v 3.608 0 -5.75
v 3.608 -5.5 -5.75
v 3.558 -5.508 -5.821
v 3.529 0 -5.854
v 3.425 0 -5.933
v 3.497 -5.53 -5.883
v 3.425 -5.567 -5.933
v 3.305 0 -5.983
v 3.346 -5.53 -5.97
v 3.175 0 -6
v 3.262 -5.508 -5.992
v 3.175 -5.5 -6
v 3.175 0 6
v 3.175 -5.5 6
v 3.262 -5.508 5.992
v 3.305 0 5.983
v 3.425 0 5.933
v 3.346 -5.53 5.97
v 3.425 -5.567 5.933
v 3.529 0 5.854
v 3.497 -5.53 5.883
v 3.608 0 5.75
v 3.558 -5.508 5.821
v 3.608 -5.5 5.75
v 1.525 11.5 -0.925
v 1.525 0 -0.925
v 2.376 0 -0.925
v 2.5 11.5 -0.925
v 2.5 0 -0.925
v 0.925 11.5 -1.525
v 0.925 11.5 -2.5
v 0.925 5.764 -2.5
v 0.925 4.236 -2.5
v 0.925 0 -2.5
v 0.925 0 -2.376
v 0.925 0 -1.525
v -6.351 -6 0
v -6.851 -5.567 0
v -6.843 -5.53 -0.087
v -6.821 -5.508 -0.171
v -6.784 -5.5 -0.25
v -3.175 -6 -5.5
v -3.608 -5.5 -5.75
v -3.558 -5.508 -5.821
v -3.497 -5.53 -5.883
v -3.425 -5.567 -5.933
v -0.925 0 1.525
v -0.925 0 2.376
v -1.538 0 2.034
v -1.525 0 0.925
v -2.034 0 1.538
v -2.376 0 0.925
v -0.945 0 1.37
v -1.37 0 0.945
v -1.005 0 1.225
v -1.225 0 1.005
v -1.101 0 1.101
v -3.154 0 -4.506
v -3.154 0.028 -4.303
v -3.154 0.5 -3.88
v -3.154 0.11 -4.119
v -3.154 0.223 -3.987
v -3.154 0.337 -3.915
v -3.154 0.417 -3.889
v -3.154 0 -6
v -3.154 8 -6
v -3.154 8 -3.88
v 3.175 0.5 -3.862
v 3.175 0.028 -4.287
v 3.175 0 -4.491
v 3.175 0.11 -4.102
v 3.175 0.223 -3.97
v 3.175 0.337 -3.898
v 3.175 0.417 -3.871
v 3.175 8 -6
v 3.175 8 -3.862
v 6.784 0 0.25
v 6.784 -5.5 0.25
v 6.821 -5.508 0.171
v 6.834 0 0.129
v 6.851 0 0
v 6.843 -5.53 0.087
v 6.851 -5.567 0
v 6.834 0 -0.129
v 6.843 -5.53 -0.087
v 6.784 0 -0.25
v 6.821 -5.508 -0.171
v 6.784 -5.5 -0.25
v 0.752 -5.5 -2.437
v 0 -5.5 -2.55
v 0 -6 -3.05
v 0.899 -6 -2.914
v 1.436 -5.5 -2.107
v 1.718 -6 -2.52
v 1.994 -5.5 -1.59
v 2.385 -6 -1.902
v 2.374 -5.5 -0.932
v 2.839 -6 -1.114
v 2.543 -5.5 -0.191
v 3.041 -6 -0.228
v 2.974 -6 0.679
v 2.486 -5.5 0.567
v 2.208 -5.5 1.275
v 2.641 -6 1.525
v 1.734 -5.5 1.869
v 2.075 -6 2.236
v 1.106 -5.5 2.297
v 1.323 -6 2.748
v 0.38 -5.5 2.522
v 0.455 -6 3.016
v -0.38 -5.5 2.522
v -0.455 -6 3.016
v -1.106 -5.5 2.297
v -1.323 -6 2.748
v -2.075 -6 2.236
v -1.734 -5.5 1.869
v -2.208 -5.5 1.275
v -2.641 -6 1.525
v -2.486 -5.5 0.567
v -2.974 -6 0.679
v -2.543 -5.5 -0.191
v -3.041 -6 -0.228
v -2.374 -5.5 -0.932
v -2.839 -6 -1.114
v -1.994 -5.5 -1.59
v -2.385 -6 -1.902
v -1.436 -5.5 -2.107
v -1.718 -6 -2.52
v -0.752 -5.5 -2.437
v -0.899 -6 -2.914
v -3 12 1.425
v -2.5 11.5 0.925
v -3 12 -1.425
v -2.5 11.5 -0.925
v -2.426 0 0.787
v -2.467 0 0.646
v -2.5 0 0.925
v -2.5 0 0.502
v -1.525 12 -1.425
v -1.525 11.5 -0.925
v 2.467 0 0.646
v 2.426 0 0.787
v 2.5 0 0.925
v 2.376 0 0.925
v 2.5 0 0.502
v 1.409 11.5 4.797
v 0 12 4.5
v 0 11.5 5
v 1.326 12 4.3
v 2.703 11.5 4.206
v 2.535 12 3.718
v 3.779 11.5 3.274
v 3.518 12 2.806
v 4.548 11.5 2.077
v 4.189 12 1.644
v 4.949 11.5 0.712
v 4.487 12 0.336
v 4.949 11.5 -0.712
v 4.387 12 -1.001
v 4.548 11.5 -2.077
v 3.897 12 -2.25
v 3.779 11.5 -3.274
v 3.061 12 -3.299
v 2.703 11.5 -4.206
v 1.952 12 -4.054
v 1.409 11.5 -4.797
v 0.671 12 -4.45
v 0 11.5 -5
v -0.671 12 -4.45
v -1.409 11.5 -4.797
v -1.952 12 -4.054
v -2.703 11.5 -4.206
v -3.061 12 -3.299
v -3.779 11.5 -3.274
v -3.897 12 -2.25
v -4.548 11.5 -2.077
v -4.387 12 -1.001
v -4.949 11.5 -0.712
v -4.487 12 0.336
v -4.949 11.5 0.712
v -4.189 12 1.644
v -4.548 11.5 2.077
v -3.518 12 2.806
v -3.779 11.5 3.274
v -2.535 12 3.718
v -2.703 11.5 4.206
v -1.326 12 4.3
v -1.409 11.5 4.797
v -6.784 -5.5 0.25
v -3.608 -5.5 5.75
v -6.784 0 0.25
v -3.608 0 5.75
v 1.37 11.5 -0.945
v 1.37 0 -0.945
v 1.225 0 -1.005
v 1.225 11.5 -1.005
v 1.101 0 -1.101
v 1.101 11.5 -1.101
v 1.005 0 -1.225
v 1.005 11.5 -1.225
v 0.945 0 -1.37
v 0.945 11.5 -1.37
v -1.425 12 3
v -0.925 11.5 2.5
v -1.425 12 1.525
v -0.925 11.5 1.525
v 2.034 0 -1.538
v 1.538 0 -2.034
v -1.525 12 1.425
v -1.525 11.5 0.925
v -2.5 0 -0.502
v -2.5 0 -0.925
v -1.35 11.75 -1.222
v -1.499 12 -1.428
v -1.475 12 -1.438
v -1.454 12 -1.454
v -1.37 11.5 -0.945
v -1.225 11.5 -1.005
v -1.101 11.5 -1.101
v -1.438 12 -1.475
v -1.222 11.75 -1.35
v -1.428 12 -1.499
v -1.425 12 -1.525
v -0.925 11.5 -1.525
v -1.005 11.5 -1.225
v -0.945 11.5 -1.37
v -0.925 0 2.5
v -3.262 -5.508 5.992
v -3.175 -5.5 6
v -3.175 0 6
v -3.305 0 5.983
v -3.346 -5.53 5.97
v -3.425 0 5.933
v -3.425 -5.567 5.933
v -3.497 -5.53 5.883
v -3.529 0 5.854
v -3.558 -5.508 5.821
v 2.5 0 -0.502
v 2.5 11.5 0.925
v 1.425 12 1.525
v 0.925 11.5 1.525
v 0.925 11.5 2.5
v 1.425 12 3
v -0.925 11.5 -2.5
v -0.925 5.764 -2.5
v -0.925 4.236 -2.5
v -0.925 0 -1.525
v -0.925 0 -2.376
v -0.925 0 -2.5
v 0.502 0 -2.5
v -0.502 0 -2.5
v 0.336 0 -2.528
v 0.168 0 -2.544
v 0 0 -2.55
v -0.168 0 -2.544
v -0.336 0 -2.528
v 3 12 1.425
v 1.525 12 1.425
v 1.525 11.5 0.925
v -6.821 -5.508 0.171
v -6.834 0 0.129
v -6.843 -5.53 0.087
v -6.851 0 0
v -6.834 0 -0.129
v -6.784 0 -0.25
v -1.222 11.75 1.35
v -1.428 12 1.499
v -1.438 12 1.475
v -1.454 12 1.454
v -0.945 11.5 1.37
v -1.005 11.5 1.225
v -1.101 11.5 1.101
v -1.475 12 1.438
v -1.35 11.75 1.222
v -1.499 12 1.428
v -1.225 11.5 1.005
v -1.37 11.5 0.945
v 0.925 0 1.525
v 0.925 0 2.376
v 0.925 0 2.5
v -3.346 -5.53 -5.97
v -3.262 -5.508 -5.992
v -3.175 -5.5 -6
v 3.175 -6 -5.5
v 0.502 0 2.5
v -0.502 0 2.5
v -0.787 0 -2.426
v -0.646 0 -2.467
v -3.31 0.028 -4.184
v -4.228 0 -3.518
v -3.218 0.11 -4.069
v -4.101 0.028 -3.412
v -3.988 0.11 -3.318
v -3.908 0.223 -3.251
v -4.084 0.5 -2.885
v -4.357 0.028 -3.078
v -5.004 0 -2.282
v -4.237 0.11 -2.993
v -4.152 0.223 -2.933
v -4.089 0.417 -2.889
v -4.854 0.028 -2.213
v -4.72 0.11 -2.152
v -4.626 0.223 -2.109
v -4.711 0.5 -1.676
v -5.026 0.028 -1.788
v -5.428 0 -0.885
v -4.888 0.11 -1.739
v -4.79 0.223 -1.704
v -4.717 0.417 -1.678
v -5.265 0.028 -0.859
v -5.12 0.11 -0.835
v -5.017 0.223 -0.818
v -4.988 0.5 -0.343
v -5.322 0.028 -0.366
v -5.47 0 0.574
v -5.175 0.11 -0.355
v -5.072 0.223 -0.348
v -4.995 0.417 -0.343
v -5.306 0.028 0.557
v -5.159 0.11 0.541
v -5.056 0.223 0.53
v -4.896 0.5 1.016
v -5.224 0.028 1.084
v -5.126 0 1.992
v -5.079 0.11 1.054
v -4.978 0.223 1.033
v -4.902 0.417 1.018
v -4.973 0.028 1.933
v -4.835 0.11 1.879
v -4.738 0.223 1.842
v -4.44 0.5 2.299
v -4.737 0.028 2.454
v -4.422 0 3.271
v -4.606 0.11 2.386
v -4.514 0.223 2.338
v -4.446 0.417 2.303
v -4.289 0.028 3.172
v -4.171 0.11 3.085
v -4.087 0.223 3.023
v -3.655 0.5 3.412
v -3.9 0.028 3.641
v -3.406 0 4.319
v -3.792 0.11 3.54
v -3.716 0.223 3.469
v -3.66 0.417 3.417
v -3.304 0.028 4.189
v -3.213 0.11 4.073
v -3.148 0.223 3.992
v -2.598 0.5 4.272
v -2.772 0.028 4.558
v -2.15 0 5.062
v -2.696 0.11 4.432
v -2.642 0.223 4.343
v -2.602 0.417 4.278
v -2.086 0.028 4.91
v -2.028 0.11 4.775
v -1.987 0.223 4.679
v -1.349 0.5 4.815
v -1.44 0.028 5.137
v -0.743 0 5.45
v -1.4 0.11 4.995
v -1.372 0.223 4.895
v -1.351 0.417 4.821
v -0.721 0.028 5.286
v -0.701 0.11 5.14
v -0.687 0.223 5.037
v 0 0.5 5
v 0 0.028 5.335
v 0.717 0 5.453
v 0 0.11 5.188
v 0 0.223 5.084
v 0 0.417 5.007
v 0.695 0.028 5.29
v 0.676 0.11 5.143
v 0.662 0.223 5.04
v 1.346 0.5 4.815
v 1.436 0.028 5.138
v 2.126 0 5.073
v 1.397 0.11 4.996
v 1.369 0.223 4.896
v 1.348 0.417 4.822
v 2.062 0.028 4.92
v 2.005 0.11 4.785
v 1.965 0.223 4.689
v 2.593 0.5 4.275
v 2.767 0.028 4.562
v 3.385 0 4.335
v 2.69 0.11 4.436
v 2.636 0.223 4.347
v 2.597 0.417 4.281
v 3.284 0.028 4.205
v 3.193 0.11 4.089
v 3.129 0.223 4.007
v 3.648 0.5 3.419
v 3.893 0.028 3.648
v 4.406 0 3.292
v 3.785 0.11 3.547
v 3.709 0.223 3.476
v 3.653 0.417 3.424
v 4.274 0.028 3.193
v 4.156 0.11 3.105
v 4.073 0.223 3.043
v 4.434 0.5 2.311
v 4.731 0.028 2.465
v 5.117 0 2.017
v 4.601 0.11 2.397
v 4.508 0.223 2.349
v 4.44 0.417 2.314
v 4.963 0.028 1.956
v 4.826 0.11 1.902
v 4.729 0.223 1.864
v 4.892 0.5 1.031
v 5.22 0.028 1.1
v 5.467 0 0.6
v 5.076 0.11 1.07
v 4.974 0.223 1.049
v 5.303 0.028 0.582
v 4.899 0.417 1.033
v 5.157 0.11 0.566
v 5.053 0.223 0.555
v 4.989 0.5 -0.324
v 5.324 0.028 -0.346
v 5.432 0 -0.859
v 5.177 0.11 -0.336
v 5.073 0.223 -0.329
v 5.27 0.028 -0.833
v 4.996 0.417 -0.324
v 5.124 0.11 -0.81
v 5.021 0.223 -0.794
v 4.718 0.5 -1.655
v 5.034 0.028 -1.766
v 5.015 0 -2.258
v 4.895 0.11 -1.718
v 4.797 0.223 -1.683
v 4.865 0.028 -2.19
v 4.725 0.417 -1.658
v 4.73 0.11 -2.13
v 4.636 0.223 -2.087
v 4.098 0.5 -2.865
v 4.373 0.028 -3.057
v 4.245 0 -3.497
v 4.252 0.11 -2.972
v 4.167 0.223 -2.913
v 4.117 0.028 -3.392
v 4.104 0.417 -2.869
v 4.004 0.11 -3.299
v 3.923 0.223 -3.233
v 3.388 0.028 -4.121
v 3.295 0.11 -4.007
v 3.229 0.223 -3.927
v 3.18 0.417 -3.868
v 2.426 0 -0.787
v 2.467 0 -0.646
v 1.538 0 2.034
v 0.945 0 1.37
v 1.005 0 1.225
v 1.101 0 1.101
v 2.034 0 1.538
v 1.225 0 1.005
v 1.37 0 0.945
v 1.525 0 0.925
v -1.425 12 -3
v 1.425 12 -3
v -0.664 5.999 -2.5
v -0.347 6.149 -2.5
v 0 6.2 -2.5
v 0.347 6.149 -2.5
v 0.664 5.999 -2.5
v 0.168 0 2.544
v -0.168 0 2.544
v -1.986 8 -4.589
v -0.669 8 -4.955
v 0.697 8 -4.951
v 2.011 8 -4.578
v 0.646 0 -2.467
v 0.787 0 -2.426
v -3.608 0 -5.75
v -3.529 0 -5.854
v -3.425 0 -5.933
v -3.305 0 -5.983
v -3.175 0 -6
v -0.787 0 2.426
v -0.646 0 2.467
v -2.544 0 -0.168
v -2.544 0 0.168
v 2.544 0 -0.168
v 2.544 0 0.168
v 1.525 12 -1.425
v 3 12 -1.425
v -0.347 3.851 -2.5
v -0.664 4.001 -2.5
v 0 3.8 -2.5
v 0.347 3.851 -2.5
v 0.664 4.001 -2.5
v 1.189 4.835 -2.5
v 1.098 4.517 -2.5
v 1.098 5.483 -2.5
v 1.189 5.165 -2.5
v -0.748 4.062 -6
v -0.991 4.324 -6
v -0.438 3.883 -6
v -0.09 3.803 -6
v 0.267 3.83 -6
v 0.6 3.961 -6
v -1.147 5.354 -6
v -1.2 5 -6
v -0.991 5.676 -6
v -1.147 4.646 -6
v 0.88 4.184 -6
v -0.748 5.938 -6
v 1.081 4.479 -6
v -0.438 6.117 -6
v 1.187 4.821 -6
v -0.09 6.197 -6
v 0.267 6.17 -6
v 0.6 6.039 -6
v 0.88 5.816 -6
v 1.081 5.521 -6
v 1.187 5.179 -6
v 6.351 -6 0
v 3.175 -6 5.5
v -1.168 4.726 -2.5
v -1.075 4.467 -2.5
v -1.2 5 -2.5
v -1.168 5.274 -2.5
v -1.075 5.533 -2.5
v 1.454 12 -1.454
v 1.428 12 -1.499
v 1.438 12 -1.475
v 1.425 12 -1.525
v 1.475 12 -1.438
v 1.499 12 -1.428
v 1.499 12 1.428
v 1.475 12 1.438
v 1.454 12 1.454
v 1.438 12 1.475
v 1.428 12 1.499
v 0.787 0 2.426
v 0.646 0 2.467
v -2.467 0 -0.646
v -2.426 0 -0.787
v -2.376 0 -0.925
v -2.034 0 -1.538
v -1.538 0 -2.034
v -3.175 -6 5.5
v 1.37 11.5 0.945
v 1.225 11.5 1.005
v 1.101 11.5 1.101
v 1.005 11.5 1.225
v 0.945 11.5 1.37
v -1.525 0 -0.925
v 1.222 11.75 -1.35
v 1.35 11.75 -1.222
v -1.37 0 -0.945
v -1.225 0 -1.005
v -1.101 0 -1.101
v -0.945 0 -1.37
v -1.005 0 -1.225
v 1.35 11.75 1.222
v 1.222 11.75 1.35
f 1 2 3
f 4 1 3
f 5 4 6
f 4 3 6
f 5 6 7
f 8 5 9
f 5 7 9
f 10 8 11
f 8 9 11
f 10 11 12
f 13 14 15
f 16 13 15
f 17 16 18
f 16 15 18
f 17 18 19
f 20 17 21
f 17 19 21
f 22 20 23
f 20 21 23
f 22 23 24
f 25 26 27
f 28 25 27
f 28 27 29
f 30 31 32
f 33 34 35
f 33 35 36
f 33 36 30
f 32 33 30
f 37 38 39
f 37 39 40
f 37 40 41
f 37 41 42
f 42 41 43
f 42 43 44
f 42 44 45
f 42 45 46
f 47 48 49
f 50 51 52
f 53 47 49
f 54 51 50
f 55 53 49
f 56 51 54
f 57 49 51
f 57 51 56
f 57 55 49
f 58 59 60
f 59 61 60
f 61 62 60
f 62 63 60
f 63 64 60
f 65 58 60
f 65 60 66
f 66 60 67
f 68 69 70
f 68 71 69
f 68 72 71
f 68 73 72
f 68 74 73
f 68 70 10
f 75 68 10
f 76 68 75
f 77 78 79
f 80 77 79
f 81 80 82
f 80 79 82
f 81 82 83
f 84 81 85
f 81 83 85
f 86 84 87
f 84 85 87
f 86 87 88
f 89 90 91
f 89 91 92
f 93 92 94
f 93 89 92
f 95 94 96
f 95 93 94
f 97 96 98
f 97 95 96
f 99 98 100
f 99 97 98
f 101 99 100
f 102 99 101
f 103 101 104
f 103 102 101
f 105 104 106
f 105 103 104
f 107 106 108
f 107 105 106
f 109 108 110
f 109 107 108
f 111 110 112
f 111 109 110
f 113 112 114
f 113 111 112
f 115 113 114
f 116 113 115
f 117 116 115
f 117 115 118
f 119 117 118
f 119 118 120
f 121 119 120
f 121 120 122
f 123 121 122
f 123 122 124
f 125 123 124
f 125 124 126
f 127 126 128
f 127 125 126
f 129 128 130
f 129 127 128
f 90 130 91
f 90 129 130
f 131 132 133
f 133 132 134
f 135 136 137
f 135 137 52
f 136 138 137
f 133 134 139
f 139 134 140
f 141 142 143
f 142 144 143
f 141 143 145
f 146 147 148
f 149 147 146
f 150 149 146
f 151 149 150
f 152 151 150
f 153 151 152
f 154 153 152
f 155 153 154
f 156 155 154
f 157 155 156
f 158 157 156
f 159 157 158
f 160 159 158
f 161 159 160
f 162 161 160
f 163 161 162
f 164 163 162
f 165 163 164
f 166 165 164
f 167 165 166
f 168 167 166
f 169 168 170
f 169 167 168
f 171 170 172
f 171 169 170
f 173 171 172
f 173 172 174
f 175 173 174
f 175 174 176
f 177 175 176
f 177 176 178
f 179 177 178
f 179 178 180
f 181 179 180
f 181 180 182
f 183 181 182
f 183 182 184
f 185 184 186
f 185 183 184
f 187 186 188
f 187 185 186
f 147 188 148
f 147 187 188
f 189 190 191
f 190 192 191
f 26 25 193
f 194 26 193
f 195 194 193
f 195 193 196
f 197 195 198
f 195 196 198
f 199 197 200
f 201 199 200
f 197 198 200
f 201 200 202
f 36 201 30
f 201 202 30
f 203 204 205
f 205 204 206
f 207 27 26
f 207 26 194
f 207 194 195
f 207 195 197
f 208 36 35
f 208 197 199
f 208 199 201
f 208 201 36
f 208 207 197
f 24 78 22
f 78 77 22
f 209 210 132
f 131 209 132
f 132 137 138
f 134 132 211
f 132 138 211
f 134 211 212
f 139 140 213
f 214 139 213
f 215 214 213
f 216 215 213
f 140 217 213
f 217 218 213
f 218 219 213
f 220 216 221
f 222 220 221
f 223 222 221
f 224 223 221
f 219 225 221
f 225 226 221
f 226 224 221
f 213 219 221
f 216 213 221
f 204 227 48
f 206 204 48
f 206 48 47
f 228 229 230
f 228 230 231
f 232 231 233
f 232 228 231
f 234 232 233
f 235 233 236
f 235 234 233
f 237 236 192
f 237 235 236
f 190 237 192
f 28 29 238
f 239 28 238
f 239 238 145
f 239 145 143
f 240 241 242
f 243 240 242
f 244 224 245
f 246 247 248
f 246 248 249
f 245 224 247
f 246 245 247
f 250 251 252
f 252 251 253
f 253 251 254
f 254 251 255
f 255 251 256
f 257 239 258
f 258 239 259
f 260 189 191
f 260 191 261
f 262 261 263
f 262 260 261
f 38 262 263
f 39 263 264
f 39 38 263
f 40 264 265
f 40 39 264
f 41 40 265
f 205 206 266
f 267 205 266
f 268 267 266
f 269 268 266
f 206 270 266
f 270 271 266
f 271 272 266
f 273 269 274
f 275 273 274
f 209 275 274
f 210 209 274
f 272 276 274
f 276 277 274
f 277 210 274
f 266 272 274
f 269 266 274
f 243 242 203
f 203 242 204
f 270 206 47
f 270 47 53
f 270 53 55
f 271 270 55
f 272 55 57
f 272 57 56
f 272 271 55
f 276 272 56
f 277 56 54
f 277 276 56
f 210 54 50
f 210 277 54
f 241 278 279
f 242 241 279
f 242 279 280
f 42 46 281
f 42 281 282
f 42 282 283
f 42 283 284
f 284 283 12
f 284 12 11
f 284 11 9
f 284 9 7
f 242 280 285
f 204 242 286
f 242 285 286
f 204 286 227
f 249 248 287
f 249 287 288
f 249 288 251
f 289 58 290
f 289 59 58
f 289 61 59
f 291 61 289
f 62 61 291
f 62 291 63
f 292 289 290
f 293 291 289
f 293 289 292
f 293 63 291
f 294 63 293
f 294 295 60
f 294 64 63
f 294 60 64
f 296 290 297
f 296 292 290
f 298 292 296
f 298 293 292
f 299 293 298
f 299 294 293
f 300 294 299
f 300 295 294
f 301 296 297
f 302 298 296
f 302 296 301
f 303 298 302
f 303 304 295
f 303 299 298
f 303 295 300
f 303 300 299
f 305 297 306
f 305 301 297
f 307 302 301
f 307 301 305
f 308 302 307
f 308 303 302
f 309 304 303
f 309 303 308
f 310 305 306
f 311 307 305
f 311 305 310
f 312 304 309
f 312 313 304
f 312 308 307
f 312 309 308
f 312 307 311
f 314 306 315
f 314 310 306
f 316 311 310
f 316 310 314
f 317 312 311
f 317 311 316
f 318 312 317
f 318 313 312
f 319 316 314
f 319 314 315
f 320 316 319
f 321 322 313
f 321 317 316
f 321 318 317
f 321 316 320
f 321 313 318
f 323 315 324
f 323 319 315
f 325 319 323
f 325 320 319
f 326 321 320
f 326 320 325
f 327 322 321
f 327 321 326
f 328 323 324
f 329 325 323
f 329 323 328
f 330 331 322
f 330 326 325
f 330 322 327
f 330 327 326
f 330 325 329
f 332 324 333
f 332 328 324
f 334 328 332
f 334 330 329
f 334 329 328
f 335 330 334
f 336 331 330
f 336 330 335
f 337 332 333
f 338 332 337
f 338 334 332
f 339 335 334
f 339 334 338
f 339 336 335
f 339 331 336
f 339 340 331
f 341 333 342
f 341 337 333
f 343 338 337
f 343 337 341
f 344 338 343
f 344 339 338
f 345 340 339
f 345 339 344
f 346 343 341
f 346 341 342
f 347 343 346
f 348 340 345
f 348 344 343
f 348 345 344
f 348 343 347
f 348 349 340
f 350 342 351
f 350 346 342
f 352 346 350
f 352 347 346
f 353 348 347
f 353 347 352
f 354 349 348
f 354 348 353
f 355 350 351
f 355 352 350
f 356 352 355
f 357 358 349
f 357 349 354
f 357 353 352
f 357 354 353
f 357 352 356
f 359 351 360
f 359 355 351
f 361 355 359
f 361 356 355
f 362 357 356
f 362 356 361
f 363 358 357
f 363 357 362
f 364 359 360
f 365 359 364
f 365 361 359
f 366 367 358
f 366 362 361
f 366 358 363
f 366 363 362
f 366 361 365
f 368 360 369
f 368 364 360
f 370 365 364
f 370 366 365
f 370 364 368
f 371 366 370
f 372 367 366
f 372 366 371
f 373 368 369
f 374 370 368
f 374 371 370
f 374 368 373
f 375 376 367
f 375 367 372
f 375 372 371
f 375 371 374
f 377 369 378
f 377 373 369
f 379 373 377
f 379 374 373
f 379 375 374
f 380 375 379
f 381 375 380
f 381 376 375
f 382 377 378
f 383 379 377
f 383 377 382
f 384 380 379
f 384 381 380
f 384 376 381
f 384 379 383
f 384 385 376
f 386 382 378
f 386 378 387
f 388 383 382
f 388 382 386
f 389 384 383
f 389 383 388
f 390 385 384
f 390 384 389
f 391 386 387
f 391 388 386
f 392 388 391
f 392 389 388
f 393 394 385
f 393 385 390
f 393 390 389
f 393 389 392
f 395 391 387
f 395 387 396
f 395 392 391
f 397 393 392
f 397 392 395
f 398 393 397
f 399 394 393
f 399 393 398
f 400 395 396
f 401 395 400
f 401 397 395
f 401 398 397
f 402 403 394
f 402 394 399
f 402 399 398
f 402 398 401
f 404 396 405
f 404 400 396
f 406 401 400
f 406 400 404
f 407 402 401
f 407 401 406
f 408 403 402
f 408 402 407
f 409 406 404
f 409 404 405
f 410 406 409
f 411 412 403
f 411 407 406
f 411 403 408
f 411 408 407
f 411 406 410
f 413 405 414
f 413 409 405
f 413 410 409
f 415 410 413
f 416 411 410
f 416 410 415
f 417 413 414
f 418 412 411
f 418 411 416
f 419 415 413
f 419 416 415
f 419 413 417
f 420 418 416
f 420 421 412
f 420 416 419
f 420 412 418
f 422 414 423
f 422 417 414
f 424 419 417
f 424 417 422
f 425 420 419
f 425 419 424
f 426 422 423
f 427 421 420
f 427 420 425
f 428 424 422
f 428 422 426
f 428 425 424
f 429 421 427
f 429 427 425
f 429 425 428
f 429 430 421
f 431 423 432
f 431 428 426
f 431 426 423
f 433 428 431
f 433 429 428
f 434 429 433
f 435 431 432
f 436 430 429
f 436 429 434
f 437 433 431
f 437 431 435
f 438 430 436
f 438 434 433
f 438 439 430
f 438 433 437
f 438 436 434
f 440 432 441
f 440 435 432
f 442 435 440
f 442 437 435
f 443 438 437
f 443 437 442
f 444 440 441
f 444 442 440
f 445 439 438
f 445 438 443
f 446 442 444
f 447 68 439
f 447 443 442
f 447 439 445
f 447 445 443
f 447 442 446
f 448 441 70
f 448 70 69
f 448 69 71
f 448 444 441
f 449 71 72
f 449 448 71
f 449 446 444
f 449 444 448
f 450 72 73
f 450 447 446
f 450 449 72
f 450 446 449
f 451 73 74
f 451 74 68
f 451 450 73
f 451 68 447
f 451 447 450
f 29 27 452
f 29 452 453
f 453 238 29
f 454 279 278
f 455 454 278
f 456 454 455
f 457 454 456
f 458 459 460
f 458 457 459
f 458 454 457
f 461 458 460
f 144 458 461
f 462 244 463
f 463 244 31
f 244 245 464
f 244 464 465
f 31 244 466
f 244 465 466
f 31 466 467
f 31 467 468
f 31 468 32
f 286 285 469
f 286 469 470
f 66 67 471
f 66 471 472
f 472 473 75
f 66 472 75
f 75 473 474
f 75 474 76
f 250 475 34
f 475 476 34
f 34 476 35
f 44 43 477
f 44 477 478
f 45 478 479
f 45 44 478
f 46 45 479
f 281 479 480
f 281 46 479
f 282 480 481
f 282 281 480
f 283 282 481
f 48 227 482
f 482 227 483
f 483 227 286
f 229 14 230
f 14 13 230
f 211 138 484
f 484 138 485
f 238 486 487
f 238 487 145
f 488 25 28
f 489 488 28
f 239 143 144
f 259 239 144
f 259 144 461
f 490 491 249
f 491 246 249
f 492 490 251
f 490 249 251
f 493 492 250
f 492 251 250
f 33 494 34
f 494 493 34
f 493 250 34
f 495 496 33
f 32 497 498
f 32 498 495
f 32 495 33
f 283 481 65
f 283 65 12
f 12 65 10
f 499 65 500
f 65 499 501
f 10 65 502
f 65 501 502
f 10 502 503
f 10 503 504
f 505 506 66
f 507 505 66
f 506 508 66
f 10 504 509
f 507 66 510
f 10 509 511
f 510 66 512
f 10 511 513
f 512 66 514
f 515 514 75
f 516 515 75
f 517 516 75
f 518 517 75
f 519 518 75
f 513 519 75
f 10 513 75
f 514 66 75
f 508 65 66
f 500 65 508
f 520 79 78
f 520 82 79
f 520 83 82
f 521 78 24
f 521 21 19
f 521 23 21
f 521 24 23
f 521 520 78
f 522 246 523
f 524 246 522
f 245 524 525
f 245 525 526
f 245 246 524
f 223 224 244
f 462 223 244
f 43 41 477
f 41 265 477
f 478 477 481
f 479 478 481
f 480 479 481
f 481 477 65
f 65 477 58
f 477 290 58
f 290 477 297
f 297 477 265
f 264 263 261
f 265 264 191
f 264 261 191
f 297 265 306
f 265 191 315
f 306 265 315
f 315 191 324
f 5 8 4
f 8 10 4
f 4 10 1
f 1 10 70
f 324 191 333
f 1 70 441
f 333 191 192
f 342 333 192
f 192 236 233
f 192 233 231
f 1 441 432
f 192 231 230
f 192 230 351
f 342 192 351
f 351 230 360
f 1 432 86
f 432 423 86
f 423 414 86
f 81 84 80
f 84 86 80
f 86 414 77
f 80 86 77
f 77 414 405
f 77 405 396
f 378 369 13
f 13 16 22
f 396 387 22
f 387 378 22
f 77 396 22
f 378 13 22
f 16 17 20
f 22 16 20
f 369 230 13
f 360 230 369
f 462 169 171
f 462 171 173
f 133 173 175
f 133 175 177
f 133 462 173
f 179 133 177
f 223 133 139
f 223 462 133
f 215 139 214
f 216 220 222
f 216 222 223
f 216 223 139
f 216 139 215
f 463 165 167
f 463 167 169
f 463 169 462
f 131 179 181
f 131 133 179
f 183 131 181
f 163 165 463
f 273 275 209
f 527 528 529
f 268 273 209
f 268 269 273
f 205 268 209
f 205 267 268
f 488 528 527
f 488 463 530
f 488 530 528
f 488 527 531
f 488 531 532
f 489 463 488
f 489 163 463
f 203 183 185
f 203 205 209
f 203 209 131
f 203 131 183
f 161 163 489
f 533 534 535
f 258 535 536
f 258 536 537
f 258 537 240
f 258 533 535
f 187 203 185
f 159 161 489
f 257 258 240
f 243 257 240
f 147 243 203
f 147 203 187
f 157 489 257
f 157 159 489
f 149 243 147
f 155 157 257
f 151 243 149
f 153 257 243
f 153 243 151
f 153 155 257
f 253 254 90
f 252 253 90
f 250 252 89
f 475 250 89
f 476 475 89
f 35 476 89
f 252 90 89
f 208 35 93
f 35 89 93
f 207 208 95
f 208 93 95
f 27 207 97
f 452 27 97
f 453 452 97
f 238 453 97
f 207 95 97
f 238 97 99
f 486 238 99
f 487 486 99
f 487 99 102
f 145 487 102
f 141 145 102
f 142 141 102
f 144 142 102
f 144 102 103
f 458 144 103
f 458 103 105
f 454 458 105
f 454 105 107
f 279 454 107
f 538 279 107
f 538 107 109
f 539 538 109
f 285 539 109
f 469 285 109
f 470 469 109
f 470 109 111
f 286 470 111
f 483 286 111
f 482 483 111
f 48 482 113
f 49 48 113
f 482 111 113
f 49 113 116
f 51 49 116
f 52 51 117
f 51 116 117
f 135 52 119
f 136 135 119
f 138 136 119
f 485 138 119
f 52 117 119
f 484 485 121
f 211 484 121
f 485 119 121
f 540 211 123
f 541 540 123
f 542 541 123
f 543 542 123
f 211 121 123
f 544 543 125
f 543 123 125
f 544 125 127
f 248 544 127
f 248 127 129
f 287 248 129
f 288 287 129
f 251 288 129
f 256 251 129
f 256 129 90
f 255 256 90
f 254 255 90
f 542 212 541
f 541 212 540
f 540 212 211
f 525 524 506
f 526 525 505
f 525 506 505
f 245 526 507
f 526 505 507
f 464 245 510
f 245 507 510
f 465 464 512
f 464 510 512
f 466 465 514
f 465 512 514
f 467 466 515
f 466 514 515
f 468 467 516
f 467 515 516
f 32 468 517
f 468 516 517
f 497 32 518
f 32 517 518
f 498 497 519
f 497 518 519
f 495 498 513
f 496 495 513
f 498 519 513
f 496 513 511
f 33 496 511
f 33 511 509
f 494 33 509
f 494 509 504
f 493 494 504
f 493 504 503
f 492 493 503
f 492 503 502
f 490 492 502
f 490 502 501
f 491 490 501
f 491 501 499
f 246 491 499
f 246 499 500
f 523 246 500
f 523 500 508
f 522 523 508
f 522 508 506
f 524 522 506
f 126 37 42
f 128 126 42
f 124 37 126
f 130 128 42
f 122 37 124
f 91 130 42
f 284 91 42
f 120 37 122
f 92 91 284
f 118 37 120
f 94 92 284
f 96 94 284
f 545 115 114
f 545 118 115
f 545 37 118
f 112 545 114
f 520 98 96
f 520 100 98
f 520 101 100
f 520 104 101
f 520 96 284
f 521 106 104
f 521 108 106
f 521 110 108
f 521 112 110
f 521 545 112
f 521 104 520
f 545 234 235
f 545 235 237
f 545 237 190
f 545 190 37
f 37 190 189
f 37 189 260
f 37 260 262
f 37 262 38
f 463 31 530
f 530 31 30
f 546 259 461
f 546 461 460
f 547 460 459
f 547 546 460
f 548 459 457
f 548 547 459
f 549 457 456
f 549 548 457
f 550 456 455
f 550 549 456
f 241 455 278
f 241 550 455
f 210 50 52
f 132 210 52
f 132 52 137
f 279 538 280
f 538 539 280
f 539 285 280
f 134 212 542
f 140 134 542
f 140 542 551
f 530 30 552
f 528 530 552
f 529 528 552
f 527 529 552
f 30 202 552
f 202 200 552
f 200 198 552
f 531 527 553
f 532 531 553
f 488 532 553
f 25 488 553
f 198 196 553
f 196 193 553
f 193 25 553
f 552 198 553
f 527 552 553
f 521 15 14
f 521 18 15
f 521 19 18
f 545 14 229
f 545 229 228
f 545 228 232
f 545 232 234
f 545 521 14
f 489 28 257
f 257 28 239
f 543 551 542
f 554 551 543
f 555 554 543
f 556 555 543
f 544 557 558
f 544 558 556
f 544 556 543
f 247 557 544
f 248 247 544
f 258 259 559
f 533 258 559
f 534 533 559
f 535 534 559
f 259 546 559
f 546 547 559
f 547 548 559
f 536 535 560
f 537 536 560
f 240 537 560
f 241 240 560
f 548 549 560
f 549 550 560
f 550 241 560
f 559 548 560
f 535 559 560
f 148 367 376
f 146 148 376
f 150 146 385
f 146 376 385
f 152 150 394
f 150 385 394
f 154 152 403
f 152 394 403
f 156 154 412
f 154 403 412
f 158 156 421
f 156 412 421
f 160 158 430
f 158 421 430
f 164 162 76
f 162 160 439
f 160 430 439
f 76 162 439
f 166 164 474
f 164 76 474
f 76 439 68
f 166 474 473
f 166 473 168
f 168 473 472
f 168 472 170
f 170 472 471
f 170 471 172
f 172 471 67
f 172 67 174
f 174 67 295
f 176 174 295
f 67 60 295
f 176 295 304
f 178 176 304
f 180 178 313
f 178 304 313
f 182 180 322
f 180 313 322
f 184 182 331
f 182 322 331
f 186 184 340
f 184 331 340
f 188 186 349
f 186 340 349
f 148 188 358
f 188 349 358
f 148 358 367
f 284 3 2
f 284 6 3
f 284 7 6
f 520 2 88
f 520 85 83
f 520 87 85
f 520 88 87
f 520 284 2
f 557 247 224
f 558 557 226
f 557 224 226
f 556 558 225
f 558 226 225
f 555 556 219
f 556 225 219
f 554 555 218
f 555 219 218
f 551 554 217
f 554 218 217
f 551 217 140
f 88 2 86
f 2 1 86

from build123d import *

# Parameters (mm, degrees)
SKETCH_1_R          = 5
EXTRUDE_4_DEPTH     = 12
FILLET_1_R          = 0.6
FILLET_2_R          = 0.6
EXTRUDE_5_DEPTH     = 6
SKETCH_3_R          = 2.55
CUT_EXTRUDE_1_DEPTH = 6
CHAMFER_1_SIZE      = 0.5
CHAMFER_4_SIZE      = 0.5
FILLET_4_R          = 0.5
FILLET_5_R          = 0.5
SKETCH_4_W          = 6.329239392
SKETCH_4_H          = 8
EXTRUDE_6_DEPTH     = 3.5
SKETCH_5_R          = 1.2
CUT_EXTRUDE_2_DEPTH = 3.5
FILLET_7_R          = 0.5


with BuildPart() as part:
    # ｽｹｯﾁ1 → ﾎﾞｽ - 押し出し4 (new body)
    with BuildSketch(Plane(origin=(0, 0, 0), x_dir=(1, 0, 0), z_dir=(0, 1, 0))):
        with Locations(Location((0, 0, 0), (0, 0, 270))):
            Circle(SKETCH_1_R)
        Polygon((-2.5, -0.925), (-2.5, 0.925), (-0.925, 0.925), (-0.925, 2.5), (0.925, 2.5), (0.925, 0.925), (2.5, 0.925), (2.5, -0.925), (0.925, -0.925), (0.925, -2.5), (-0.925, -2.5), (-0.925, -0.925), align=None, mode=Mode.SUBTRACT)
    extrude(amount=EXTRUDE_4_DEPTH)

    # ﾌｨﾚｯﾄ1
    fillet_1_edges = [part.edges().sort_by_distance(p)[0] for p in [
        (0.925, 6, -0.925),
    ]]
    fillet(fillet_1_edges, radius=FILLET_1_R)

    # ﾌｨﾚｯﾄ2
    fillet_2_edges = [part.edges().sort_by_distance(p)[0] for p in [
        (-0.925, 6, -0.925),
        (-0.925, 6, 0.925),
        (0.925, 6, 0.925),
    ]]
    fillet(fillet_2_edges, radius=FILLET_2_R)

    # ｽｹｯﾁ2 → ﾎﾞｽ - 押し出し5 (add)
    with BuildSketch(Plane.XZ):
        Polygon((6.92820323, 0), (3.464101615, 6), (-3.464101615, 6), (-6.92820323, 0), (-3.464101615, -6), (3.464101615, -6), align=None)
    extrude(amount=EXTRUDE_5_DEPTH)

    # ｽｹｯﾁ3 → ｶｯﾄ - 押し出し1 (cut)
    with BuildSketch(Plane.XZ.offset(6)):
        with Locations(Location((0, 0, 0), (0, 0, 270))):
            Circle(SKETCH_3_R)
    extrude(amount=-CUT_EXTRUDE_1_DEPTH, mode=Mode.SUBTRACT)

    # 面取り1
    chamfer_1_edges = [part.edges().sort_by_distance(p)[0] for p in [
        (0, -6, 2.55),
        (5.196152423, -6, -3),
        (5.196152423, -6, 3),
        (0, -6, 6),
        (-5.196152423, -6, 3),
        (-5.196152423, -6, -3),
        (0, -6, -6),
    ]]
    chamfer(chamfer_1_edges, length=CHAMFER_1_SIZE)

    # 面取り4
    chamfer_4_edges = [part.edges().sort_by_distance(p)[0] for p in [
        (2.5, 12, 0),
        (-2.0125, 12, -0.925),
        (-2.0125, 12, 0.925),
        (-2.5, 12, 0),
        (0, 12, -5),
        (2.0125, 12, -0.925),
        (1.100735931, 12, -1.100735931),
        (-0.925, 12, 2.0125),
        (2.0125, 12, 0.925),
        (0.925, 12, 2.0125),
        (1.100735931, 12, 1.100735931),
        (-1.100735931, 12, -1.100735931),
        (-1.100735931, 12, 1.100735931),
        (0.925, 12, -2.0125),
        (0, 12, -2.5),
        (0, 12, 2.5),
        (-0.925, 12, -2.0125),
    ]]
    chamfer(chamfer_4_edges, length=CHAMFER_4_SIZE)

    # ﾌｨﾚｯﾄ4
    fillet_4_edges = [part.edges().sort_by_distance(p)[0] for p in [
        (-3.464101615, -2.75, 6),
    ]]
    fillet(fillet_4_edges, radius=FILLET_4_R)

    # ﾌｨﾚｯﾄ5
    fillet_5_edges = [part.edges().sort_by_distance(p)[0] for p in [
        (3.464101615, -2.75, -6),
        (-3.464101615, -2.75, -6),
        (-6.92820323, -2.75, 0),
        (3.464101615, -2.75, 6),
        (6.92820323, -2.75, 0),
    ]]
    fillet(fillet_5_edges, radius=FILLET_5_R)

    # ｽｹｯﾁ4 → ﾎﾞｽ - 押し出し6 (add)
    with BuildSketch(Plane.XY.offset(-2.5)):
        with Locations((0.010806785, 4)):
            Rectangle(SKETCH_4_W, SKETCH_4_H)
    extrude(amount=-EXTRUDE_6_DEPTH)

    # ｽｹｯﾁ5 → ｶｯﾄ - 押し出し2 (cut)
    with BuildSketch(Plane(origin=(0, 0, -6), x_dir=(-1, 0, 0), z_dir=(0, 0, -1))):
        with Locations((0, 5)):
            Circle(SKETCH_5_R)
    extrude(amount=-CUT_EXTRUDE_2_DEPTH, mode=Mode.SUBTRACT)

    # ﾌｨﾚｯﾄ7
    fillet_7_edges = [part.edges().sort_by_distance(p)[0] for p in [
        (-4.7116556, 0, 1.673410144),
    ]]
    fillet(fillet_7_edges, radius=FILLET_7_R)


solid = part.part
